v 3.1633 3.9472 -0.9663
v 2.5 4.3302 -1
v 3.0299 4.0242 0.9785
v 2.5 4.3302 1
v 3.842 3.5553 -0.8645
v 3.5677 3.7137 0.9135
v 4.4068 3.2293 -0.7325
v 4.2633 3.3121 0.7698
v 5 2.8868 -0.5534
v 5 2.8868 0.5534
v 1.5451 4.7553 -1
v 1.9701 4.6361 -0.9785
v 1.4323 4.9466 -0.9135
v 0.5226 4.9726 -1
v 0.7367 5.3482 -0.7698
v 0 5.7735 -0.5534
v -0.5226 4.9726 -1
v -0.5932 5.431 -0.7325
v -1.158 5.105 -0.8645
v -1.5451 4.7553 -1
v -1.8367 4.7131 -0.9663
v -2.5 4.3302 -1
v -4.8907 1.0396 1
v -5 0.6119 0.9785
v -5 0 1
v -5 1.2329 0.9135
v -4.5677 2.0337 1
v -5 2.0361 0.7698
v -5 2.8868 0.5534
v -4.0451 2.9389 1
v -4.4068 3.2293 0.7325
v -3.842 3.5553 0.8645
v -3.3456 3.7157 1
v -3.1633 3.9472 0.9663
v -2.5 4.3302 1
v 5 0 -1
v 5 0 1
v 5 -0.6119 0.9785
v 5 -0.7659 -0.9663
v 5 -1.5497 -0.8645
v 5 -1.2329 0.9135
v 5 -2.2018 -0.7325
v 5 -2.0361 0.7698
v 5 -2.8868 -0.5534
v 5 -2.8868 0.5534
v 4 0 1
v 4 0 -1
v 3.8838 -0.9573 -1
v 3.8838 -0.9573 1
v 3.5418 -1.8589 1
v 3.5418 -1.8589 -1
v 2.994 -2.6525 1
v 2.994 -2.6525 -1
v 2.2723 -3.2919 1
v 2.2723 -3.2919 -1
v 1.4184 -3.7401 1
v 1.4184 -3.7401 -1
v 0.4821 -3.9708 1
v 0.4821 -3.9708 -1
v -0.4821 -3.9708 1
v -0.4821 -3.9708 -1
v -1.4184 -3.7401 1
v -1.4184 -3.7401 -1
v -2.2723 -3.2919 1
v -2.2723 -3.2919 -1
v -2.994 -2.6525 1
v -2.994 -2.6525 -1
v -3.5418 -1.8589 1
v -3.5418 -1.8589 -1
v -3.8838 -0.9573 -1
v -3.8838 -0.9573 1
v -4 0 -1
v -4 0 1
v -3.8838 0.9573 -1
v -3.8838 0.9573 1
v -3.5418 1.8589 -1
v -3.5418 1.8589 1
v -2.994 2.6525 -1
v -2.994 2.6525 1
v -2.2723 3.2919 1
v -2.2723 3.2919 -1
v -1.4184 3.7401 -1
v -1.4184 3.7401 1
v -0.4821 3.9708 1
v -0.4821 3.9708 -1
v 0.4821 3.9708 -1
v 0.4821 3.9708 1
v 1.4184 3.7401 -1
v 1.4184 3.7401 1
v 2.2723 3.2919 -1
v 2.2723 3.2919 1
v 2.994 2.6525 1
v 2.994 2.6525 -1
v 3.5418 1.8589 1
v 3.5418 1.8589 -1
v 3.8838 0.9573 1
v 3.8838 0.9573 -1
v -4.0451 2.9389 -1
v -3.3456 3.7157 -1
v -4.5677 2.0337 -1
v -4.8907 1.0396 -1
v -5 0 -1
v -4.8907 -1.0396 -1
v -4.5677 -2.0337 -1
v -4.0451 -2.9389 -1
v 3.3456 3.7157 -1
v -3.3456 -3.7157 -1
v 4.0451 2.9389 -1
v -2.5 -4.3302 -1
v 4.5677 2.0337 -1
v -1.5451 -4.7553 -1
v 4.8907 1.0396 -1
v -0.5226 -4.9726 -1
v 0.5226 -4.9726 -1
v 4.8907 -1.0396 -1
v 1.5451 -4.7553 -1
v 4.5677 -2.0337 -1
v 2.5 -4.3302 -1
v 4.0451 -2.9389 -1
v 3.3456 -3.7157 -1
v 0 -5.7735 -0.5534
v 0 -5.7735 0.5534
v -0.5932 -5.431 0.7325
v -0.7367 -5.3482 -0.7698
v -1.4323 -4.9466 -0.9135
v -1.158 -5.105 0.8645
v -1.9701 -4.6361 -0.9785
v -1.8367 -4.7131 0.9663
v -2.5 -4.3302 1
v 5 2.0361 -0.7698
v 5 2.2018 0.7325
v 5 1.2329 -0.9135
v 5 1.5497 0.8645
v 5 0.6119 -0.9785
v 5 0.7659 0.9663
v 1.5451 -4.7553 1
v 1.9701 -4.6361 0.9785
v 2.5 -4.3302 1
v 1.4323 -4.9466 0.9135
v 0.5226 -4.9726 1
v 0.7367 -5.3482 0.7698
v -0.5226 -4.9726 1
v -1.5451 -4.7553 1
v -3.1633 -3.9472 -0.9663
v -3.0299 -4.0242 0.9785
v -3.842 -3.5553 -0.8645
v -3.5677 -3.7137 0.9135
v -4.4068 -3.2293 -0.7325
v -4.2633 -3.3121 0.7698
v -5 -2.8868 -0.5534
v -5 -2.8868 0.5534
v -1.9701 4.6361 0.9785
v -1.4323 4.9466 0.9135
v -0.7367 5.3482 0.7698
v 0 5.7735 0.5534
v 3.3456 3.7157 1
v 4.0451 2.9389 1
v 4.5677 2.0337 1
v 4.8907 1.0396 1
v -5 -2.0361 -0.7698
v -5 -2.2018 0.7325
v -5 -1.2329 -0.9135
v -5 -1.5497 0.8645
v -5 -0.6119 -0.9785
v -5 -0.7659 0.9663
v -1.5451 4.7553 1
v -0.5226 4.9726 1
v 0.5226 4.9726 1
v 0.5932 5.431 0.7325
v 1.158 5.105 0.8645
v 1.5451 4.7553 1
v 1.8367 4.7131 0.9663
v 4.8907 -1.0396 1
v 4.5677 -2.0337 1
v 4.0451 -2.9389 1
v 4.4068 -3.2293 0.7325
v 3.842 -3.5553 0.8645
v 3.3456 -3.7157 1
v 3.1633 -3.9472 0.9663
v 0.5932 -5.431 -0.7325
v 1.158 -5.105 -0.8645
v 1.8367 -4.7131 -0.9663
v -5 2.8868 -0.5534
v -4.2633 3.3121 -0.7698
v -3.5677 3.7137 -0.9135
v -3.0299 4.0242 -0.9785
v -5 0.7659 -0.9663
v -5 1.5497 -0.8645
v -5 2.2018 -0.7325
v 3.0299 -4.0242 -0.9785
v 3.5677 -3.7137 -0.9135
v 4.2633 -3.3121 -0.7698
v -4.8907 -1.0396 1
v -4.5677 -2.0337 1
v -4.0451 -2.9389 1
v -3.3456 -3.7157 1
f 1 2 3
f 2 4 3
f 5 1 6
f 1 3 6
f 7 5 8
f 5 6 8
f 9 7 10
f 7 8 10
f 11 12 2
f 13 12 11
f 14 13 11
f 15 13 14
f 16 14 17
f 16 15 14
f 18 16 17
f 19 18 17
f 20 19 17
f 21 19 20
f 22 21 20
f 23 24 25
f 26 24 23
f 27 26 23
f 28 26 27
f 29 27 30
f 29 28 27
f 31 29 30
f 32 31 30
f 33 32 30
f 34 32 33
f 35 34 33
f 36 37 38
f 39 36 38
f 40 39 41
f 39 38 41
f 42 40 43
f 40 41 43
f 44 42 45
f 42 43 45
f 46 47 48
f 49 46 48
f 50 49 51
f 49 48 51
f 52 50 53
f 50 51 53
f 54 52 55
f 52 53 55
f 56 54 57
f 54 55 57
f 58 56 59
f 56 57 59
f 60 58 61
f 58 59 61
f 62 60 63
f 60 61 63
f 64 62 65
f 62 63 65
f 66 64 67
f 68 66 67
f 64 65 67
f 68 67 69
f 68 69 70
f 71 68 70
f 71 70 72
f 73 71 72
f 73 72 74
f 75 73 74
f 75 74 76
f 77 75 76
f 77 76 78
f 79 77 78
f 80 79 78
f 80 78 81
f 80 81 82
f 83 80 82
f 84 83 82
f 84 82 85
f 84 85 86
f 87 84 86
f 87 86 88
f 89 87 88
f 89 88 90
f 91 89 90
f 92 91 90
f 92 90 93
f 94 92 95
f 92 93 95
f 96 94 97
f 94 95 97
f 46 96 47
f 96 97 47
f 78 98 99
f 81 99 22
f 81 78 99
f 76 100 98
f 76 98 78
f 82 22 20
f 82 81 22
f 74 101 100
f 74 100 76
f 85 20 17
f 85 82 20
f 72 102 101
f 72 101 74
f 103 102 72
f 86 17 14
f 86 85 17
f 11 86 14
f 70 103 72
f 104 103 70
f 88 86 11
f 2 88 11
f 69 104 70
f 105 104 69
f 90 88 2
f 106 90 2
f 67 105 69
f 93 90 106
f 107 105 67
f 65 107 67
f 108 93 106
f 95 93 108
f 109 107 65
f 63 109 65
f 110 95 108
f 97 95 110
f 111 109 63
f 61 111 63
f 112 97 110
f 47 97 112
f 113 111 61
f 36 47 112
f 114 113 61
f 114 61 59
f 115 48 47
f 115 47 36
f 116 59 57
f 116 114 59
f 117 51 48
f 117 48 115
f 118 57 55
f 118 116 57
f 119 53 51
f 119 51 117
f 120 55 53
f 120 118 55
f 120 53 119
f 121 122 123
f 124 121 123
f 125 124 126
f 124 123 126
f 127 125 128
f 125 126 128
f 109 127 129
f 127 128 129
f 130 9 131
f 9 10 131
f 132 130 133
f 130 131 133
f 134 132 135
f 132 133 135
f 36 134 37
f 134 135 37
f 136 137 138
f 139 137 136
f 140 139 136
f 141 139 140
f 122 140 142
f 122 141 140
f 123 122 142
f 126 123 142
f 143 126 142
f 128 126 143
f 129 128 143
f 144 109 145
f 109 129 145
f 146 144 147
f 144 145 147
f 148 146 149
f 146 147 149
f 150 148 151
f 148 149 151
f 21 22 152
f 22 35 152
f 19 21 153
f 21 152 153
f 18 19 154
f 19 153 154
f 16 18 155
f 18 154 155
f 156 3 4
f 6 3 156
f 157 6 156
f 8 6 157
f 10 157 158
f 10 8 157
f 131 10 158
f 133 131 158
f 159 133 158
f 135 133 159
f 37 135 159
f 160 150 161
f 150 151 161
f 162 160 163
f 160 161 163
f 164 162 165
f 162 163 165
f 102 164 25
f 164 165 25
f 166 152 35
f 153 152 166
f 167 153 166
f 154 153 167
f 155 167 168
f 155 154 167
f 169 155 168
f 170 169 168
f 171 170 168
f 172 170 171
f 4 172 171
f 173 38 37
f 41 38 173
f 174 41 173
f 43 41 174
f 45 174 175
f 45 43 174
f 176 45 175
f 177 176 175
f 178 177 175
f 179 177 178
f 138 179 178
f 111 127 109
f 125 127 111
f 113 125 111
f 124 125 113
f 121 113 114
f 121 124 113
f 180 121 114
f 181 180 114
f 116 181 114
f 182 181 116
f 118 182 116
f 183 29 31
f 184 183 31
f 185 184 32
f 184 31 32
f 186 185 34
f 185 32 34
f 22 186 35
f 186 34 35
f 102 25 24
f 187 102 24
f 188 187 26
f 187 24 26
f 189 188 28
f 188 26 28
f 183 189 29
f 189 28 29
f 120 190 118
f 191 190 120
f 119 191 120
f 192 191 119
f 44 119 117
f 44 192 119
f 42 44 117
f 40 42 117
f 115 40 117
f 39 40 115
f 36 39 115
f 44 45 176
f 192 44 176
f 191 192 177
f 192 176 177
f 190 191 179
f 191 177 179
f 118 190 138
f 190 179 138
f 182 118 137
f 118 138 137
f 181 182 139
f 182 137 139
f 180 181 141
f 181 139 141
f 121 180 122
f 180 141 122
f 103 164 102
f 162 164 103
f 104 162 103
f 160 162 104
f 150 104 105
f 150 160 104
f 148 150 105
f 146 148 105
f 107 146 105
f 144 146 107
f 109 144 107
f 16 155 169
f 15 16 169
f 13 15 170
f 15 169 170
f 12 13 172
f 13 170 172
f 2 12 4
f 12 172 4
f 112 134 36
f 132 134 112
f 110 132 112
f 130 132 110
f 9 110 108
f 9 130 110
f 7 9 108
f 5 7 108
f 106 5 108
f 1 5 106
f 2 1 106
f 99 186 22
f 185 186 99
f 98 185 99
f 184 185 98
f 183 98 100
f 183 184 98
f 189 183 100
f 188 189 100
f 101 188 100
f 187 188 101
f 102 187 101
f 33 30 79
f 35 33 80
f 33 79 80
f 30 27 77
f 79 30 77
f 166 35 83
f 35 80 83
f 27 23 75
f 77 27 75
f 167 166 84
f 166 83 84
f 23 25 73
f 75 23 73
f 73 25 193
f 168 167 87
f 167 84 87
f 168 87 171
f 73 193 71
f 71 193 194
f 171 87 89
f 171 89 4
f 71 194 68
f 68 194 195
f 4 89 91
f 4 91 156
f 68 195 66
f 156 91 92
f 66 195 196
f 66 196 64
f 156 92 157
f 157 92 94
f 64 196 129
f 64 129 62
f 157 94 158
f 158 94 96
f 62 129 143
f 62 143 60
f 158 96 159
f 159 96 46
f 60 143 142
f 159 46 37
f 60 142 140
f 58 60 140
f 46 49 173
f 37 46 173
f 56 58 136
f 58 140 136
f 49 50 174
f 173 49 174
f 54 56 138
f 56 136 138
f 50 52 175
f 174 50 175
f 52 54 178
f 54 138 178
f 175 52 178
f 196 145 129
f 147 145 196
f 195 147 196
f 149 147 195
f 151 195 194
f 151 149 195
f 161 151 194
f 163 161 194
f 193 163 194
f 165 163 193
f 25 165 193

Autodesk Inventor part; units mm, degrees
ref_plane "YZ Plane" through (0, 0, 0) normal (1, 0, 0) x (0, 1, 0)
ref_plane "XZ Plane" through (0, 0, 0) normal (0, 1, 0) x (-1, 0, 0)
ref_plane "XY Plane" through (0, 0, 0) normal (0, 0, 1) x (1, 0, 0)
sketch "Sketch1" plane through (0, 0, 0) normal (0, 1, 0) x (-1, 0, 0)
  line L0 (0, 1) -> (0, -1)
  line L1 (-4, 1) -> (-4, -1)
  line L2 (-4, -1) -> (-5, -1)
  line L3 (-5, -1) -> (-6.7321, 0)
  line L4 (-6.7321, 0) -> (-5, 1)
  line L5 (-5, 1) -> (-4, 1)
  point P0 (0, 0)
  point P1 (0, 0)
  dimension "d0" = 10
  dimension "d1" = 8
  dimension "d2" = 2
  dimension "d4" = 30
revolve "Revolution1" add sketch "Sketch1" angle 360 about axis through (0, 0, 1) along (0, 0, -1)
sketch "Sketch2" plane through (0, 0, 1) normal (0, 0, 1) x (1, 0, 0)
  circle A0 centre (0, 0) radius 4 projected
  circle A1 centre (0, 0) radius 5 projected
  line L0 (0, 5.7735) -> (5, 2.8868)
  line L1 (5, 2.8868) -> (5, -2.8868)
  line L2 (5, -2.8868) -> (0, -5.7735)
  line L3 (0, -5.7735) -> (-5, -2.8868)
  line L4 (-5, -2.8868) -> (-5, 2.8868)
  line L5 (-5, 2.8868) -> (0, 5.7735)
  point P0 (0, 0)
extrude "Extrusion1" cut sketch "Sketch2" against normal through all keep common part
thread "Thread1" size "M8x0.5" class "6H" standard "ANSI Metric M Profile" full length
properties part number "Nut_M8x0.5_2mm" material "Brass, Soft Yellow"
